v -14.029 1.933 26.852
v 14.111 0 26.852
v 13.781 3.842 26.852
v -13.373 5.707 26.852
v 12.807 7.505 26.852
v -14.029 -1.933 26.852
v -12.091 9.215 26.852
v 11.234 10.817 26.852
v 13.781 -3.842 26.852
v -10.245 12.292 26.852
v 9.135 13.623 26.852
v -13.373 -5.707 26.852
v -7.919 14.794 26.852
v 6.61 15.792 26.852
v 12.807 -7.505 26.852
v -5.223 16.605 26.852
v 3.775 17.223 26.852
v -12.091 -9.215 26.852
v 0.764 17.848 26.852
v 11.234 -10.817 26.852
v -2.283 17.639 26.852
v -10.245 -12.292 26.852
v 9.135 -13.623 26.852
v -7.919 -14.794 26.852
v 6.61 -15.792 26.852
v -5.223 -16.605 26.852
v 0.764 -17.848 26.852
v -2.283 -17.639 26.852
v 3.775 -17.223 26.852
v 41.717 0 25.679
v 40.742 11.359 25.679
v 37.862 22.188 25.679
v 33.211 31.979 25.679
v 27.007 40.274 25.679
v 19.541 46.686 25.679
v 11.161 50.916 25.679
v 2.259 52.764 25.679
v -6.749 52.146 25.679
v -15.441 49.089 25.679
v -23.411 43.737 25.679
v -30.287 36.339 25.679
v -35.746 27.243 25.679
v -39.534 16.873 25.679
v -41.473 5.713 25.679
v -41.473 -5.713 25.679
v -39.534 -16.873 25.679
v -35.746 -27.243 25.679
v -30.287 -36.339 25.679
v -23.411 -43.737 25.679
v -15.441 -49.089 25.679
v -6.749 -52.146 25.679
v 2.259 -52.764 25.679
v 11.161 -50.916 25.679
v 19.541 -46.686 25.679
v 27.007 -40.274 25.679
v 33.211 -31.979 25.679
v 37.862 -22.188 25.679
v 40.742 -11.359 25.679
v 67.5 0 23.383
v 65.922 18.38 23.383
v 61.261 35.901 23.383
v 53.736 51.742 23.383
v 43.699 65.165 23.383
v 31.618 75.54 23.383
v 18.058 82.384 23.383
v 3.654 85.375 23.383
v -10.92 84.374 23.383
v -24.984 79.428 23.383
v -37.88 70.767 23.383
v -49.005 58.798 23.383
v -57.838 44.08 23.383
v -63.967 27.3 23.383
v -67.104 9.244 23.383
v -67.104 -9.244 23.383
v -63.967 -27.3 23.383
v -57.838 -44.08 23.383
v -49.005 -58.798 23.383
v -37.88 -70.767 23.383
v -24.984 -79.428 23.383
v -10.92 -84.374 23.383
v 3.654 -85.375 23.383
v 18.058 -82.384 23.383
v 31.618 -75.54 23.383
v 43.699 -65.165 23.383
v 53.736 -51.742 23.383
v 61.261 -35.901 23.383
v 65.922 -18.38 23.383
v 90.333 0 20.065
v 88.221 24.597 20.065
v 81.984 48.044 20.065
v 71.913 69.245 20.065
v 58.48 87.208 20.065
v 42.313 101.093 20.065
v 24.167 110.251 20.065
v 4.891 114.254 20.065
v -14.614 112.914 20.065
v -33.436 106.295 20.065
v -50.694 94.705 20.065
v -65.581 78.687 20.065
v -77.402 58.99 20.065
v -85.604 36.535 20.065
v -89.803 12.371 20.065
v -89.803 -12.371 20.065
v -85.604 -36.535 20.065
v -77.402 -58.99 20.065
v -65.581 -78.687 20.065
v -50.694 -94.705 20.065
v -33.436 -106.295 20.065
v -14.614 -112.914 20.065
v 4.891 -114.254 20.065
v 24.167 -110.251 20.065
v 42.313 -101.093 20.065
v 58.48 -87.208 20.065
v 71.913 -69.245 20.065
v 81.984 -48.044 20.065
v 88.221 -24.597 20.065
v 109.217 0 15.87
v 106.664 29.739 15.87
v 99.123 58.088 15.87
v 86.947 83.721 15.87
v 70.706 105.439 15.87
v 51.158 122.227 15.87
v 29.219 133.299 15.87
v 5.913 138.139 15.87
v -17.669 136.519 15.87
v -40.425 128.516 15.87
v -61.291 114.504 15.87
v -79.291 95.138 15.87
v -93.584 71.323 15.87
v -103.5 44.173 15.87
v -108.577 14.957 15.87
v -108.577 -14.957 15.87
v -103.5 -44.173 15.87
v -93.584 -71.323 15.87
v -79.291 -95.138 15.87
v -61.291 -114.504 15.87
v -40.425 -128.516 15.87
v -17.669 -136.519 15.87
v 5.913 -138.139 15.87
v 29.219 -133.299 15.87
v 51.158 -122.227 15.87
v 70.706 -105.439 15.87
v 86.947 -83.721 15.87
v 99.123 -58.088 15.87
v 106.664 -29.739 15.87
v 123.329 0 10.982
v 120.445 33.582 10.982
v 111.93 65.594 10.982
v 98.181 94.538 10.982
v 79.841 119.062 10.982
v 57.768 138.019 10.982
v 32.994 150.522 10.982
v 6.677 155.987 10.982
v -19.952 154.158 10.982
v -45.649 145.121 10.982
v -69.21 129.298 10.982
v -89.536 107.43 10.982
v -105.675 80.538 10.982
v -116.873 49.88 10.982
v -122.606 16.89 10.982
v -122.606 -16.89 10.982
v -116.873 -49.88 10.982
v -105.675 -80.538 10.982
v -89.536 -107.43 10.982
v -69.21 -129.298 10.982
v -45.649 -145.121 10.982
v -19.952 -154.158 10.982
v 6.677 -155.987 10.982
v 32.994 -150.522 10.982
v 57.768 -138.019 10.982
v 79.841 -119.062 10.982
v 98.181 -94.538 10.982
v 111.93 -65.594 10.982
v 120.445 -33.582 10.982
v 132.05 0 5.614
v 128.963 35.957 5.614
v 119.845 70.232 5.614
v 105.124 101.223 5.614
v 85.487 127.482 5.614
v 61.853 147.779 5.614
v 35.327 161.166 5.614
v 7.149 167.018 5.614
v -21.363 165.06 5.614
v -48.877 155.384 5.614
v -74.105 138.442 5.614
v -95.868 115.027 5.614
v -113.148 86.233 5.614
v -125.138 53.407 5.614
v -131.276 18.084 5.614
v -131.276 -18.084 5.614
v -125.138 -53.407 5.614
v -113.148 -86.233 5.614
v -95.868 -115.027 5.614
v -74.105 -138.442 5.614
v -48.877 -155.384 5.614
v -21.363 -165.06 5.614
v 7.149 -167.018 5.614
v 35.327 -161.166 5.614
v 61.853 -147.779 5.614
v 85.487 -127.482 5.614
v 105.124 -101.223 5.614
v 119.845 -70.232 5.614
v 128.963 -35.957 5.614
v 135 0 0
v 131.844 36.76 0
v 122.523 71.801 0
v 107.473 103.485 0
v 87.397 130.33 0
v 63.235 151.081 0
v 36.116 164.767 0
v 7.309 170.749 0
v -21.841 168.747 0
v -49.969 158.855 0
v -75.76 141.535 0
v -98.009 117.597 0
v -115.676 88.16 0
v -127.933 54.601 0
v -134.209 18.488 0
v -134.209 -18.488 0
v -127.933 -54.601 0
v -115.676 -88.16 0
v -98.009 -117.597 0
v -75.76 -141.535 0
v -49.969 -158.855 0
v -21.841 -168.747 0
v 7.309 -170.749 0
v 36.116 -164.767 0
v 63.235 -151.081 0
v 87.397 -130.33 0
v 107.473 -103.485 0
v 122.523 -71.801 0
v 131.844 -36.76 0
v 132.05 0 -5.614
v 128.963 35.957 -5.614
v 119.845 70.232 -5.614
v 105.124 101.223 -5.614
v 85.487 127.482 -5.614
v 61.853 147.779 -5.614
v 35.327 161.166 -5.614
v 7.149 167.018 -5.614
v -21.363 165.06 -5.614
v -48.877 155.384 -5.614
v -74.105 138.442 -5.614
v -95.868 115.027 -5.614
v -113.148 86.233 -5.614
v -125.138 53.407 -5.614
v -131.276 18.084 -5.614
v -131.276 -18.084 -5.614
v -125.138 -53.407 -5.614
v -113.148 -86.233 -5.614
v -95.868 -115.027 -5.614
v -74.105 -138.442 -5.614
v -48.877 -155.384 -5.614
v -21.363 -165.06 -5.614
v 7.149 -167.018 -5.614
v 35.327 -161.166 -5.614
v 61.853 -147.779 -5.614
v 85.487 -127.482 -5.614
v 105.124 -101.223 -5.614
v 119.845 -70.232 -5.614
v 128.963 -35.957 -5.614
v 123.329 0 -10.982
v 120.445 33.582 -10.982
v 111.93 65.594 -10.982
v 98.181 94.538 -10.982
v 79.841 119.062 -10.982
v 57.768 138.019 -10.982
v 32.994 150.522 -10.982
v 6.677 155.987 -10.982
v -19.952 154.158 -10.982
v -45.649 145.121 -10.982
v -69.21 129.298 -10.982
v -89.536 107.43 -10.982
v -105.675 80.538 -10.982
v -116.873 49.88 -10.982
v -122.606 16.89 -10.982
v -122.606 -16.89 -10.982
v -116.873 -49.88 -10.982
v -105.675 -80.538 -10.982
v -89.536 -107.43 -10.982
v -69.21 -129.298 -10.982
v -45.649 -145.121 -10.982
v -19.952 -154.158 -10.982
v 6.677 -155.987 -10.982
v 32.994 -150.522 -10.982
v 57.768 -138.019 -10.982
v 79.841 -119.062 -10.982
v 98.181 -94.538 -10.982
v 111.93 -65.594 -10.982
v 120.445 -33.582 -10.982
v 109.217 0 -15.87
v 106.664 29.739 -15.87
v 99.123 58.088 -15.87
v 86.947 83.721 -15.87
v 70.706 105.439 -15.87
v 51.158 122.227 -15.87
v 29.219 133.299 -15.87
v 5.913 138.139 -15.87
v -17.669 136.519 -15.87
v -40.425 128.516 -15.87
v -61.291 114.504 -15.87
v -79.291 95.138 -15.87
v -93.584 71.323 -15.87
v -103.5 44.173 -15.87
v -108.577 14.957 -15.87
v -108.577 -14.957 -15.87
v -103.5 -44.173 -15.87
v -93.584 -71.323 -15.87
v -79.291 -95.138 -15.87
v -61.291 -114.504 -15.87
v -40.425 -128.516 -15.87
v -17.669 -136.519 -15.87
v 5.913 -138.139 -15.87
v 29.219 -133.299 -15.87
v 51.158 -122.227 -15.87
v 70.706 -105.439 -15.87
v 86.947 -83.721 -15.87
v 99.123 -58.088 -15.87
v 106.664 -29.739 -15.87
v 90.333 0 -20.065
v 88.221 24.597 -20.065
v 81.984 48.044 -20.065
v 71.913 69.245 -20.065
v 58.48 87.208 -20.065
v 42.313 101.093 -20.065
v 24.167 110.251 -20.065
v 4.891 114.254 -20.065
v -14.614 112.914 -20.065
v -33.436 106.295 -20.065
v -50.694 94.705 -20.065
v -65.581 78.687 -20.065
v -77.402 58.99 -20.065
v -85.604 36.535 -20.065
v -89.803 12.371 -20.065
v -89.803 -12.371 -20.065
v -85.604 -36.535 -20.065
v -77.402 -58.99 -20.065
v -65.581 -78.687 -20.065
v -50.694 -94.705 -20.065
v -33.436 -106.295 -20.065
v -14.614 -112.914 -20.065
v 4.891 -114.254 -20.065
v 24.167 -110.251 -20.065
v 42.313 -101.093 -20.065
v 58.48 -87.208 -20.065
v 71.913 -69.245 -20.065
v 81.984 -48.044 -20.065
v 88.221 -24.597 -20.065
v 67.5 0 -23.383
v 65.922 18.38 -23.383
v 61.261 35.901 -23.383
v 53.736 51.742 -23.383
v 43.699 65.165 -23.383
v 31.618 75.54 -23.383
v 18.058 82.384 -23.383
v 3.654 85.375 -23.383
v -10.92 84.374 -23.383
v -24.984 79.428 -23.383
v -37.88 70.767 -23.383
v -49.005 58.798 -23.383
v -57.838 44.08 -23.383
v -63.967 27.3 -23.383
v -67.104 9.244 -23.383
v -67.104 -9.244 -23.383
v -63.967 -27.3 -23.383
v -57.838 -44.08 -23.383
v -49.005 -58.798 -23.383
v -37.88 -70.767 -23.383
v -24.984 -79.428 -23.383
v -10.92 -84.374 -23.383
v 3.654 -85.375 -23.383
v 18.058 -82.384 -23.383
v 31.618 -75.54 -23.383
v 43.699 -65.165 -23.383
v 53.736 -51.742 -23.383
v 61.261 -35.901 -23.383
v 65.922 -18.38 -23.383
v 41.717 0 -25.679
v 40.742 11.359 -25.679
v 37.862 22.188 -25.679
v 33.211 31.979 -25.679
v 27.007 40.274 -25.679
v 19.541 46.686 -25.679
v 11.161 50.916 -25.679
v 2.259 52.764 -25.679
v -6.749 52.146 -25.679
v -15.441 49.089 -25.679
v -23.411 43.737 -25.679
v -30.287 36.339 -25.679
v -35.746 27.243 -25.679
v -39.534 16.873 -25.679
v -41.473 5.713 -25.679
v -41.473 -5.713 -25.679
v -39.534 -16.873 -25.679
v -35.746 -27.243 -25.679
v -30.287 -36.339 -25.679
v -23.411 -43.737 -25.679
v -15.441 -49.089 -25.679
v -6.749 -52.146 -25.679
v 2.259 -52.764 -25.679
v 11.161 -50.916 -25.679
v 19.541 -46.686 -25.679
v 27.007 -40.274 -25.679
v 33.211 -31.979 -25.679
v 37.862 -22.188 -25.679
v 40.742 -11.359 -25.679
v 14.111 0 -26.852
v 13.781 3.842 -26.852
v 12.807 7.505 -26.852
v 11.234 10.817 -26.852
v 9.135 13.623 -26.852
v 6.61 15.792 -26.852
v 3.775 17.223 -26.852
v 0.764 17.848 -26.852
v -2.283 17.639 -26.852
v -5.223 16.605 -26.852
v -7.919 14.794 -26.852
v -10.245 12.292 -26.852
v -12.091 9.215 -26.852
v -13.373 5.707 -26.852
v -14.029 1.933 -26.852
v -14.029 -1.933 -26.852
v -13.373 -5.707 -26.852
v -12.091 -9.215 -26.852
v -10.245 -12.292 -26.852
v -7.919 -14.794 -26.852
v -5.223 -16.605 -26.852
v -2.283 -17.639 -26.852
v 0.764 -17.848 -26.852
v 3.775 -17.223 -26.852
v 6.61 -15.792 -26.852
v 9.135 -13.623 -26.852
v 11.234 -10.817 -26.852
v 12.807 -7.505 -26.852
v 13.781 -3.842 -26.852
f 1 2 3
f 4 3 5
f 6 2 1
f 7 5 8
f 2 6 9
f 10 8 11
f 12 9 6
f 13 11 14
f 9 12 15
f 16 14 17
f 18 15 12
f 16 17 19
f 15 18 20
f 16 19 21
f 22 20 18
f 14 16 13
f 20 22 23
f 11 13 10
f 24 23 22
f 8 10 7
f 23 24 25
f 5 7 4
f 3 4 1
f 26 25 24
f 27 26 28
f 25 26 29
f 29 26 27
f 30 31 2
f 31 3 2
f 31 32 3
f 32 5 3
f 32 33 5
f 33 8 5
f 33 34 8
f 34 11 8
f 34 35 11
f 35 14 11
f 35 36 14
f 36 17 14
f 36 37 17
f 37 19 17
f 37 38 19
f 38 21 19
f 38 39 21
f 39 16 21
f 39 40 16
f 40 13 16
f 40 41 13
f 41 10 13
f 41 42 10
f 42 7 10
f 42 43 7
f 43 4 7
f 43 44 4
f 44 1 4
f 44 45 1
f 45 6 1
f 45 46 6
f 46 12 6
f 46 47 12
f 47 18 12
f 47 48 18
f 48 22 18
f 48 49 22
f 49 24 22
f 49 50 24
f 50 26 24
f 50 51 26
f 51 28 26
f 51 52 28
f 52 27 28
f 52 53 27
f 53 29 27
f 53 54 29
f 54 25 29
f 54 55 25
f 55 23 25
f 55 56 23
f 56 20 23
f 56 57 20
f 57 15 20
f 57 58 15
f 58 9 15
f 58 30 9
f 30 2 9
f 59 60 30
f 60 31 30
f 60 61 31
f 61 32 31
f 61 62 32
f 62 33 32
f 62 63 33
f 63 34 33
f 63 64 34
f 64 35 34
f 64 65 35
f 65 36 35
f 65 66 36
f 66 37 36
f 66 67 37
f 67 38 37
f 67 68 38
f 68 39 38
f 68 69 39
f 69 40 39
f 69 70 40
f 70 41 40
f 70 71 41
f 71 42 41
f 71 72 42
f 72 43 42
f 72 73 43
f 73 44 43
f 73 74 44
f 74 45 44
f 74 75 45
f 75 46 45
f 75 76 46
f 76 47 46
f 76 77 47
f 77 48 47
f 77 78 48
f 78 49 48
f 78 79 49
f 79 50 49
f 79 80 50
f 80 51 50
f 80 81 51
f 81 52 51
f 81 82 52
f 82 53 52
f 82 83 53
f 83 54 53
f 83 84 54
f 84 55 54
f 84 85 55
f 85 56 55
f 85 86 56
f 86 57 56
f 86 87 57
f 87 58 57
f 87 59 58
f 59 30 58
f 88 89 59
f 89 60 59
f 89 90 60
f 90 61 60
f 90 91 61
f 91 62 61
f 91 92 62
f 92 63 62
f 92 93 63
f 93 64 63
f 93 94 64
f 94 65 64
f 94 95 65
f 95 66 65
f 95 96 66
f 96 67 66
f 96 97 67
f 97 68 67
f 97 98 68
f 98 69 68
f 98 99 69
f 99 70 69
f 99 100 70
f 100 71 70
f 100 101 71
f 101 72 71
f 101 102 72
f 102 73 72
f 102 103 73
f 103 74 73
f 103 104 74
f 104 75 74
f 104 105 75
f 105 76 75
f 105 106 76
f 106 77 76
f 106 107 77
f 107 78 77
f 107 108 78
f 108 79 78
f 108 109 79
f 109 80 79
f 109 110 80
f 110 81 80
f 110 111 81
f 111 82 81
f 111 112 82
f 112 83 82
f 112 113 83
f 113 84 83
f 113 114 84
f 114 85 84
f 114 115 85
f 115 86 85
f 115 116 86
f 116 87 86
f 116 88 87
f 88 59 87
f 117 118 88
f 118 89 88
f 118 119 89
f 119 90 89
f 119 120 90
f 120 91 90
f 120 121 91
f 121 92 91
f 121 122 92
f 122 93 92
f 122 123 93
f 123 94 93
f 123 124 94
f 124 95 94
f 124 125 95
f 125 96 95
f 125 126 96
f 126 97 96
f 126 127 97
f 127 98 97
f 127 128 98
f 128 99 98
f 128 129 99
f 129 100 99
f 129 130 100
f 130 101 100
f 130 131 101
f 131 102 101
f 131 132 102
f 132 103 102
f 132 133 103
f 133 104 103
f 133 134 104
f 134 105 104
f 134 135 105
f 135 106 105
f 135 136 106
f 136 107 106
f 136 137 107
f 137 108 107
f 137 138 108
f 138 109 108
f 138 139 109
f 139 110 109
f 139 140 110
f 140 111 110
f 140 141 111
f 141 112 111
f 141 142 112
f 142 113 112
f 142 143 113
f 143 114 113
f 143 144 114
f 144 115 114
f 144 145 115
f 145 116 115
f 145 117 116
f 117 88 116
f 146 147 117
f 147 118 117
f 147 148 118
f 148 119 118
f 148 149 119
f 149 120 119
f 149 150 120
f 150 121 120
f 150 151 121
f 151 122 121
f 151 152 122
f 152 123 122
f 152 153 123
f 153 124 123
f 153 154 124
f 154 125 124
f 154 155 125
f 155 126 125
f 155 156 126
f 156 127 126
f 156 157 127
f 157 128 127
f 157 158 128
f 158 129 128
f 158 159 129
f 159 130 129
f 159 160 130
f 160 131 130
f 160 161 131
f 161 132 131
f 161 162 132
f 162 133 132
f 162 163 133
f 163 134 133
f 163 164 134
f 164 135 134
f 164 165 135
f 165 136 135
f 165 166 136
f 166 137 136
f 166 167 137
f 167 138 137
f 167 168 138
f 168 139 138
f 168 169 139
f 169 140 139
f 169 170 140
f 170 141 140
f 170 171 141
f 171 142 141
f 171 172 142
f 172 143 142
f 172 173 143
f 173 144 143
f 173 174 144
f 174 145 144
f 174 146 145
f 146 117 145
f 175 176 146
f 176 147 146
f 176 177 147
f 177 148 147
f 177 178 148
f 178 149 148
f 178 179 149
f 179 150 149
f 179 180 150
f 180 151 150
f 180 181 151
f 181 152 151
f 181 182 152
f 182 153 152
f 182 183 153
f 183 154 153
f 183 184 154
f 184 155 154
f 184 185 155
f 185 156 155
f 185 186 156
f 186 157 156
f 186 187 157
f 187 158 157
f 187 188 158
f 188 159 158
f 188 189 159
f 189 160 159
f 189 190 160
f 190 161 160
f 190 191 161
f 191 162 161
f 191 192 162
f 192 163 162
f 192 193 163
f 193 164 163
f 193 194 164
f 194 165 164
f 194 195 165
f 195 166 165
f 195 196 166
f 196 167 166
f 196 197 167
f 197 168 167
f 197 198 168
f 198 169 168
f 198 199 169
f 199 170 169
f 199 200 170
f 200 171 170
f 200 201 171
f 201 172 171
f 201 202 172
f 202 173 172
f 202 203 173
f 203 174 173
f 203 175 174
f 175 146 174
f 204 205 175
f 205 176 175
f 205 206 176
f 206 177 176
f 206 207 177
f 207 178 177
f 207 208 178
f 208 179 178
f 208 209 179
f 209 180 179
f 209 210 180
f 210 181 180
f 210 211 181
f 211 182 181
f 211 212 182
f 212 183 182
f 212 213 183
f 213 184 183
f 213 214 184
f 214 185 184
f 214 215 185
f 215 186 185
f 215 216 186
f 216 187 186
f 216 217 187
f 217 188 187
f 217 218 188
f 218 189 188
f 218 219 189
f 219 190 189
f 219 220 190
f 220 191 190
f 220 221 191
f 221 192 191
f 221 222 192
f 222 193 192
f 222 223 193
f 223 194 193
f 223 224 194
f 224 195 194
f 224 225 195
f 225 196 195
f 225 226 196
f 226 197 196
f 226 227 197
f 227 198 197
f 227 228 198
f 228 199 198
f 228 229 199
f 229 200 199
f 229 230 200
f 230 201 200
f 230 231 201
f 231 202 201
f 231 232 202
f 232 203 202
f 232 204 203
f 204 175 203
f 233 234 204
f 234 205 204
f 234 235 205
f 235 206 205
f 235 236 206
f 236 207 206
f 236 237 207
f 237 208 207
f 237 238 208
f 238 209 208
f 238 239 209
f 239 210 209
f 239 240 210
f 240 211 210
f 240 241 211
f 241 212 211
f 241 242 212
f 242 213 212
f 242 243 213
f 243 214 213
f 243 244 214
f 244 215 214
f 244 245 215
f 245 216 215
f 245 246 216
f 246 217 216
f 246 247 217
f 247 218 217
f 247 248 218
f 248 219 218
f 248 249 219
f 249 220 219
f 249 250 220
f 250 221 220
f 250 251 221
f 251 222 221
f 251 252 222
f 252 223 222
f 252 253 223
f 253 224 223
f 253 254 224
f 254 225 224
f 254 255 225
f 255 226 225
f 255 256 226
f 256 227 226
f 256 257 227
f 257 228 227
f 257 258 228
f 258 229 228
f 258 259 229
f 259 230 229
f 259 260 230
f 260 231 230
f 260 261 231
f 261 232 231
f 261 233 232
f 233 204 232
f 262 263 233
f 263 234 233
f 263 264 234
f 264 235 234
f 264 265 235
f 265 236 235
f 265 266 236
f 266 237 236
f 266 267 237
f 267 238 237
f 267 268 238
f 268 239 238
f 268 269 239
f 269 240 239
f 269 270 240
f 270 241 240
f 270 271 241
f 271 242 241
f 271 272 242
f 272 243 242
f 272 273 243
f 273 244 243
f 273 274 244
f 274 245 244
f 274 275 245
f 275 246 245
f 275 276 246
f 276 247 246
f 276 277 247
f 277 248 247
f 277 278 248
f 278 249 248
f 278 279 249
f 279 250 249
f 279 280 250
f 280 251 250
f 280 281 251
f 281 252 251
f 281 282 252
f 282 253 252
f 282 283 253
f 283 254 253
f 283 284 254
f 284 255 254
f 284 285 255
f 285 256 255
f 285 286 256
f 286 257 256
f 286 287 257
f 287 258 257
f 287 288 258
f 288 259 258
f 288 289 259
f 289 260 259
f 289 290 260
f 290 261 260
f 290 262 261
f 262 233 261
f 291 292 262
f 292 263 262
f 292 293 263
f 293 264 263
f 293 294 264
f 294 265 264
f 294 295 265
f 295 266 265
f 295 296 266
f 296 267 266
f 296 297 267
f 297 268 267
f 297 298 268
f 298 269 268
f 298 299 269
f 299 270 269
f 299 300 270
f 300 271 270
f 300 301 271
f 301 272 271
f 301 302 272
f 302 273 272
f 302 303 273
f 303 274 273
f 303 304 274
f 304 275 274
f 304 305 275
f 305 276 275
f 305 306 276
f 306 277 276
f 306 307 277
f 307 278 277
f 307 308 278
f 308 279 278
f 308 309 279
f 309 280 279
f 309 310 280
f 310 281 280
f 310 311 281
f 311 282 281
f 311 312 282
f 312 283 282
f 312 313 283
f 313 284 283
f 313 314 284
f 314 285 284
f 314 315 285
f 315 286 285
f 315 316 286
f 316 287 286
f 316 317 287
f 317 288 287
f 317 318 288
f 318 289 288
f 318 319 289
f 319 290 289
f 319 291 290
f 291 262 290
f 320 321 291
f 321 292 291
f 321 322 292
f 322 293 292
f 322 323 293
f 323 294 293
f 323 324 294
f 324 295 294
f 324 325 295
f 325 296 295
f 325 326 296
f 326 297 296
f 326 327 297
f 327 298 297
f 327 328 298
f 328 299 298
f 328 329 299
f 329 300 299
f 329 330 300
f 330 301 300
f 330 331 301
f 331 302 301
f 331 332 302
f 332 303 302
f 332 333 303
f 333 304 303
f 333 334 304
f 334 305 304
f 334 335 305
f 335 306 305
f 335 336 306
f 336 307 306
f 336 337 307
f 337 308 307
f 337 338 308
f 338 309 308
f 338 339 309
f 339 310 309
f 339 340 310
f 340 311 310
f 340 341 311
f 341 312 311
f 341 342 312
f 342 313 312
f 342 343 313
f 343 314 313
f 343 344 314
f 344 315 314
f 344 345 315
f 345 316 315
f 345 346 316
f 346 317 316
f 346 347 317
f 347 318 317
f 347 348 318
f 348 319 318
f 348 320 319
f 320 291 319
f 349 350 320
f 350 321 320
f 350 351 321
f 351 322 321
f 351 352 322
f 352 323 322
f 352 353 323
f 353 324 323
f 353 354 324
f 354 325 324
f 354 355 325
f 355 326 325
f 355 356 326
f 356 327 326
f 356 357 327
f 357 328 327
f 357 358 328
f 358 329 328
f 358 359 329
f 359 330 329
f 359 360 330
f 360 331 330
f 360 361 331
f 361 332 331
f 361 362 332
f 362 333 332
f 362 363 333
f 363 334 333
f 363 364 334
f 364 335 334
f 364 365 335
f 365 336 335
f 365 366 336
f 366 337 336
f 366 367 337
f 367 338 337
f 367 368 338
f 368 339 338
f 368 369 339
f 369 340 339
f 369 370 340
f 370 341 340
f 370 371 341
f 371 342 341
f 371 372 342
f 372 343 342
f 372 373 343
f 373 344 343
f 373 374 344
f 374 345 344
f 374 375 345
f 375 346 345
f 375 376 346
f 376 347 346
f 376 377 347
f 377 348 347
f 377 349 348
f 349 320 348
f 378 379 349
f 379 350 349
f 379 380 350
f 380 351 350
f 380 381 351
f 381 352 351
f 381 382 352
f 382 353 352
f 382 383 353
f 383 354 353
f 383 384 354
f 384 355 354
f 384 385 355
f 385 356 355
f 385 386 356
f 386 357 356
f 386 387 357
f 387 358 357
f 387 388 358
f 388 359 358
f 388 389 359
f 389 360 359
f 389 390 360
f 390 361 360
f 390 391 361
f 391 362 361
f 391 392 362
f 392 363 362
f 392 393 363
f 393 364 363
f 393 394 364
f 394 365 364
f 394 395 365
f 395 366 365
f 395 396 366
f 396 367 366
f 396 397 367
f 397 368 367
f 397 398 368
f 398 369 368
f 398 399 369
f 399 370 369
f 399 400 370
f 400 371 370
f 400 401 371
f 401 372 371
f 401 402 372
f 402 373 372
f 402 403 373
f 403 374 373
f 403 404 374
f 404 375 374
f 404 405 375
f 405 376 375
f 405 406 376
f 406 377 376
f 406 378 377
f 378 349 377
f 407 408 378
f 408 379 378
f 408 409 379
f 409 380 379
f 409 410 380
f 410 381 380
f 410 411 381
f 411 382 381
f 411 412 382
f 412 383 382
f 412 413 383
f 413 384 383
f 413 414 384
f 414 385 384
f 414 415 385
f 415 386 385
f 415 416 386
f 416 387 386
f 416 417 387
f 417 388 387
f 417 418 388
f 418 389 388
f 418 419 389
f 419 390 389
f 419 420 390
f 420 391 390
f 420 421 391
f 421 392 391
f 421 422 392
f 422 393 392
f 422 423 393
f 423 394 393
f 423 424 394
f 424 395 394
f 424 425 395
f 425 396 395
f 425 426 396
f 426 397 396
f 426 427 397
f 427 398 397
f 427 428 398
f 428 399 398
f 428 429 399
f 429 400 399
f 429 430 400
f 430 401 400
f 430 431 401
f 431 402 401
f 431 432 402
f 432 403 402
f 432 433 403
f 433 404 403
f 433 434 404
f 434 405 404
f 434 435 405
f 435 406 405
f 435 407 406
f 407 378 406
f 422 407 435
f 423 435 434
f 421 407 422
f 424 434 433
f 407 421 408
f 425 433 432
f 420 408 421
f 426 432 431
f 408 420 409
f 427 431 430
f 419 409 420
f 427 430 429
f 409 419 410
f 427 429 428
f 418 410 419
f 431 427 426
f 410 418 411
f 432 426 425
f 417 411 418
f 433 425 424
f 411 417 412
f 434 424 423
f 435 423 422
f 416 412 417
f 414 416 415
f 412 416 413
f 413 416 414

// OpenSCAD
// Generated by SolidPython 1.0.1 on 2020-07-29 00:46:52


scale(v = [15, 19, 3]) {
	sphere(r = 9);
}
/***********************************************
*********      SolidPython code:      **********
************************************************
 
# import packages: SolidPython
from solid import *
from solid.utils import *
from itertools import chain, combinations, permutations


class Resize:

    def __init__(self, scad_file):
        self.scad_file = scad_file
        #self.scad_file = import_scad(scad_file)
        # cone/cylinder param:
        self.r1 = 0
        self.r2 = 0
        self.h = 0
        # rectangular prism param:
        self.w = 0
        self.l = 0
        # ellipse param:
        self.r = 0

    # import OpenScad code (file name corresponds to shape)


    # classify shape + parameters
    def assign(self, param1, param2, param3):
        if self.scad_file == 'cone.scad':
            self.r1 = param1
            self.r2 = param2
            self.h = param3
        elif self.scad_file == 'cylinder.scad':
            self.r1 = param1
            self.r2 = param2
            self.h = param3
        elif self.scad_file == 'rectangularPrism.scad':
            self.h = param1
            self.l = param2
            self.w = param3
        else:
            self.r = param1
            self.h = param2

    # resize parameters
    def iterate(self):
        x = range(3, 20, 2)
        i = 1
        if self.scad_file == 'cone.scad':
            tempList = list(permutations(x, 2))
            for temp in tempList:
                param1 = temp[0]
                param2 = temp[1]
                filepath = 'produced_scad_files/' + 'cone' + str(param1) + '_' + str(param2) + '_' + '.scad'
                scad_render_to_file(cylinder(h=param1, r1=param2, r2=0), filepath)

        elif self.scad_file == 'cylinder.scad':
            tempList = list(permutations(x, 3))
            for temp in tempList:
                param1 = temp[0]
                param2 = temp[1]
                filepath = 'produced_scad_files/' + 'cylinder' + str(param1) + '_' + str(param2) + '_' + '.scad'
                scad_render_to_file(cylinder(h=param1, r1=param2, r2=param2), filepath)

        elif self.scad_file == 'rectangularPrism.scad':
            tempList = list(permutations(x, 3))
            for temp in tempList:
                param1 = temp[0]
                param2 = temp[1]
                param3 = temp[2]
                filepath = 'produced_scad_files/' + 'rectangularPrism' + str(param1) + '_' + str(param2) + '_' + str(
                    param3) + '.scad'
                scad_render_to_file(cube(size=(param1, param2, param3)), filepath)

        elif self.scad_file == 'ellipse.scad':
            tempList = list(permutations(x, 4))
            for temp in tempList:
                param1 = temp[0]
                param2 = temp[1]
                param3 = temp[2]
                param4 = temp[3]
                filepath = 'produced_scad_files/' + 'ellipse' + str(param1) + '_' + str(param2) + '_' + str(param3) + '_' + str(param4) + '.scad'
                scad_render_to_file(scale([param1, param2, param3])(sphere(r=param4)), filepath)

    def render_to_scadfile(self):
        scad_render_to_file(scad, 'example.scad') 
 
************************************************/
